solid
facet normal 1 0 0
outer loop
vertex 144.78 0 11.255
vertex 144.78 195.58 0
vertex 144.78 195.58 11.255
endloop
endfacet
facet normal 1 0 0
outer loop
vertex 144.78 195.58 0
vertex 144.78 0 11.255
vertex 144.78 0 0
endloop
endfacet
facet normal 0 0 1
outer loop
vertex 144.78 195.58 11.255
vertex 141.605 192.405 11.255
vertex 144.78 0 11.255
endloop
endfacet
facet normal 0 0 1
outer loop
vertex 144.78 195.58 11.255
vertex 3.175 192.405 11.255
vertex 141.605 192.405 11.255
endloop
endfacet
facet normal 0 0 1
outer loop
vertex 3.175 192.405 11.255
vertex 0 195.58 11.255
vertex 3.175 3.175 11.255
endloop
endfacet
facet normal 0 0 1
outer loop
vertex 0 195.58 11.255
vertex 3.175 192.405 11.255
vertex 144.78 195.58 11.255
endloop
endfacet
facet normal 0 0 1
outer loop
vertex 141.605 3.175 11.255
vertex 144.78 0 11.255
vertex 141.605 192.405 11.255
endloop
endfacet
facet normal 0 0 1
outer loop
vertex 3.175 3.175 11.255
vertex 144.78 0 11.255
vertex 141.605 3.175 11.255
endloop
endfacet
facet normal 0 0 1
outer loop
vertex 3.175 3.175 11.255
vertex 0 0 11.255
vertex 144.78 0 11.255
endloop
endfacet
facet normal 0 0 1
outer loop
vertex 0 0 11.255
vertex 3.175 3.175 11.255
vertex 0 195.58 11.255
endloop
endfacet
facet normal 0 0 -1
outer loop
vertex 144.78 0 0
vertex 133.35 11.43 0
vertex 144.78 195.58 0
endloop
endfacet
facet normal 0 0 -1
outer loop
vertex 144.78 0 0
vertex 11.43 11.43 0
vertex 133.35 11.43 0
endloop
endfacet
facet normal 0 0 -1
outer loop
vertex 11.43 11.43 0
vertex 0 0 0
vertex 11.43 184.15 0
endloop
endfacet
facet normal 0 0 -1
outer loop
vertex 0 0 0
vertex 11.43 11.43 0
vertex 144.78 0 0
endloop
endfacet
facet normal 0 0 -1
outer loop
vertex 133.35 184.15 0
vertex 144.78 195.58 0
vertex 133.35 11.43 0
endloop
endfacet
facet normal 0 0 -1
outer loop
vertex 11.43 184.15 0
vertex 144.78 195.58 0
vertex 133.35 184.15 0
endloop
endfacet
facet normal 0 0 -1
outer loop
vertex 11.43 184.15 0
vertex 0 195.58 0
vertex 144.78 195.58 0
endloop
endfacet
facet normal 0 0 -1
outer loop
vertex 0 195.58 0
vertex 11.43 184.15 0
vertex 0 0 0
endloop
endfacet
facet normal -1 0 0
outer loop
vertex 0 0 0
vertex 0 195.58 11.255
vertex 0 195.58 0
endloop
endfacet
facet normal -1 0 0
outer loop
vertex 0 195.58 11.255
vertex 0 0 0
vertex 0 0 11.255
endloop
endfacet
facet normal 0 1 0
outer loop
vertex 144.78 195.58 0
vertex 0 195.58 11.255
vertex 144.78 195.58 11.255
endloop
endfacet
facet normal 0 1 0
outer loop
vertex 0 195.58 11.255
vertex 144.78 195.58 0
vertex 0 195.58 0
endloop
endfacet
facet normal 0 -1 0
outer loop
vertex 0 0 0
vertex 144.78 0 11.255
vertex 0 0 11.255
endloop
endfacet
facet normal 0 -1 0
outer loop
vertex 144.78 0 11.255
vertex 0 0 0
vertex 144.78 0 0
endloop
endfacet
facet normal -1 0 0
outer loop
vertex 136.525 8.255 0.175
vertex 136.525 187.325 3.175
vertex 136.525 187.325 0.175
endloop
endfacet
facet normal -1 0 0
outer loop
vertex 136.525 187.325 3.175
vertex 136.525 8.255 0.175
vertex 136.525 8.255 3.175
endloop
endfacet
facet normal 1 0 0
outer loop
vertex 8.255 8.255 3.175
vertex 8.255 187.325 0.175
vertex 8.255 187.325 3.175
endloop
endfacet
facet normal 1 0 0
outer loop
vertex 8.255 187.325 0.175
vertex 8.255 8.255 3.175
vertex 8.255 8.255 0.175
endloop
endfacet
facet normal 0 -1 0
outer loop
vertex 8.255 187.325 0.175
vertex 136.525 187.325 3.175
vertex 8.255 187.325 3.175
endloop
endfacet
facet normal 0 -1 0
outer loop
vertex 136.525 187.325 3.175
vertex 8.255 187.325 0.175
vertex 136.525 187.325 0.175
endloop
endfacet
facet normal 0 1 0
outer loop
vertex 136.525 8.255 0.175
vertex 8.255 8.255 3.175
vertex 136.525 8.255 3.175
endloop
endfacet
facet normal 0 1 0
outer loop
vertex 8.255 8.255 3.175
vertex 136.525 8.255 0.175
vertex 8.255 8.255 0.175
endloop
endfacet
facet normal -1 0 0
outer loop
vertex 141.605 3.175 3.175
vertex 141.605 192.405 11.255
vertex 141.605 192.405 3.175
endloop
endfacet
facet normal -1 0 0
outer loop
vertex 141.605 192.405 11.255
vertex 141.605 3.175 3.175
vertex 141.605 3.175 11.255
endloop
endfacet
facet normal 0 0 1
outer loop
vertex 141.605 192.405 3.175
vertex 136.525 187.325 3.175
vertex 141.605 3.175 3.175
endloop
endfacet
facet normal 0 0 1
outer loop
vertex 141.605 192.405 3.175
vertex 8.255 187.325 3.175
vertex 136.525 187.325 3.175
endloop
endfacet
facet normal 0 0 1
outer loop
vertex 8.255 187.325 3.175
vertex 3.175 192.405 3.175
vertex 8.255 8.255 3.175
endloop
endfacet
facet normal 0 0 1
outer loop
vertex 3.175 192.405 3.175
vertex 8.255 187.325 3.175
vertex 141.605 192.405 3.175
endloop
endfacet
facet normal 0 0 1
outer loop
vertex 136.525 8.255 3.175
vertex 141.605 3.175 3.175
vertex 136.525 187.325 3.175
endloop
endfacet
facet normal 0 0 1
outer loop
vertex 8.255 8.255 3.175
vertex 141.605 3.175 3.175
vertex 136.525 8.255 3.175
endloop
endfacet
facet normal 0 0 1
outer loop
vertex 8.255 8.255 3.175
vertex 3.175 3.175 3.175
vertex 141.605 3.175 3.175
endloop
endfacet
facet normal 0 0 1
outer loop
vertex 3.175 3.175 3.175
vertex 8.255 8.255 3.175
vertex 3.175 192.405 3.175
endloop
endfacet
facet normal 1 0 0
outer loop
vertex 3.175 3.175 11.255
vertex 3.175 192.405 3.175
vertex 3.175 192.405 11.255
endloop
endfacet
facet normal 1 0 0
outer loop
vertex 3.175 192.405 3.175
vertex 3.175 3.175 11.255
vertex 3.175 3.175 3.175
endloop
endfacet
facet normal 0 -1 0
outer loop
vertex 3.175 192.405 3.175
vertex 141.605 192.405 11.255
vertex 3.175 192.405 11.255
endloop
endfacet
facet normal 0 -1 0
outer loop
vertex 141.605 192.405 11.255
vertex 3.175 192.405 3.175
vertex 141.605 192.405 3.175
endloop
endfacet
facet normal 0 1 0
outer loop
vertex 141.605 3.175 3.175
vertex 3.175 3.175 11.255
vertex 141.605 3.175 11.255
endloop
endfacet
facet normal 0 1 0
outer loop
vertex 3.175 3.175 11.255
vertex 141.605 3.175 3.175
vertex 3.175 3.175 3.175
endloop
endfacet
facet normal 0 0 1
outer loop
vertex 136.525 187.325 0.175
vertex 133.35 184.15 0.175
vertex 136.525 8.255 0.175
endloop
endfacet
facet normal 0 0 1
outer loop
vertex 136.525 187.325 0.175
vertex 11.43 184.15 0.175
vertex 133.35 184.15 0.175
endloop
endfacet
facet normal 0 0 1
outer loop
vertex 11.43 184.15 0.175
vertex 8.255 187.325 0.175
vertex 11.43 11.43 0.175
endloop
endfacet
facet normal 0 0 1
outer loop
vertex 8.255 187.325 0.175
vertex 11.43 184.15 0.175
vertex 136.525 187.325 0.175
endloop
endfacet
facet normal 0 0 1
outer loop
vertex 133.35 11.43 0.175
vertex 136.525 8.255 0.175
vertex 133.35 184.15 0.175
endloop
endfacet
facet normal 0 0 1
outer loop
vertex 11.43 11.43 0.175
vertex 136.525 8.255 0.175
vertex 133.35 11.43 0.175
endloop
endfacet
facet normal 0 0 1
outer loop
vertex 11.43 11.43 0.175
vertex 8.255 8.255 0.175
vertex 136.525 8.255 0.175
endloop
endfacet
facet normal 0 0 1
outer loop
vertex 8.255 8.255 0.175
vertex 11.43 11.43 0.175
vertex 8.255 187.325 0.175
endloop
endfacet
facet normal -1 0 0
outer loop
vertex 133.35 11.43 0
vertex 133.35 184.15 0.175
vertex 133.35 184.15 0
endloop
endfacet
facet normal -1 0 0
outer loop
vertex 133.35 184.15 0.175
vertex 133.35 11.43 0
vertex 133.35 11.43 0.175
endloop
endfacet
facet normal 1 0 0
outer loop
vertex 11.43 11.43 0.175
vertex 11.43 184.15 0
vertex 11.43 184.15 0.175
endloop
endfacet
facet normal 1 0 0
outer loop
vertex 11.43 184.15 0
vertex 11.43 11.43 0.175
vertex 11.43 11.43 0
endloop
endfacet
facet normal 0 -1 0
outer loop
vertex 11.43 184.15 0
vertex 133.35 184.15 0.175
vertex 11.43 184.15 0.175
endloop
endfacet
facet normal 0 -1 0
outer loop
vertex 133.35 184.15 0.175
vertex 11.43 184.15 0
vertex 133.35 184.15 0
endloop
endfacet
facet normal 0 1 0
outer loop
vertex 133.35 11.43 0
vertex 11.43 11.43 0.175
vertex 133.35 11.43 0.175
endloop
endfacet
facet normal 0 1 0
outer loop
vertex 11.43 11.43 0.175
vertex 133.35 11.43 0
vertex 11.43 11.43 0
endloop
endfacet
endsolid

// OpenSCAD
inch = 25.4;

picture_x = 5.05 * inch;
picture_y = 7.05 * inch;
picture_z = 3;

wall_thickness = .2 * inch;

frame_x = picture_x + (wall_thickness * 2);
frame_y = picture_y + (wall_thickness * 2);
frame_z = picture_z + wall_thickness;

overhang = (1/8 * inch);

echo(overhang);


outside_x = frame_x + (overhang * 2);
outside_y = frame_y + (overhang * 2);
outside_z = frame_z + overhang;

picture_inset = overhang + wall_thickness;

difference() {
    cube([outside_x, outside_y, outside_z]);
    
    translate([picture_inset, picture_inset, 0]) {
        cube([picture_x, picture_y, picture_z + 10]);
    }
    
    translate([overhang, overhang, overhang]) {
        cube([frame_x, frame_y, frame_y + 10]);
    }
}

difference() {
    translate([picture_inset, picture_inset, 0]) {
        cube([picture_x, picture_y, (overhang - picture_z)]);
    }

    translate([picture_inset + overhang, picture_inset + overhang, 0]) {
        cube([picture_x - (overhang * 2), picture_y - (overhang * 2), 8]);
    }
}
